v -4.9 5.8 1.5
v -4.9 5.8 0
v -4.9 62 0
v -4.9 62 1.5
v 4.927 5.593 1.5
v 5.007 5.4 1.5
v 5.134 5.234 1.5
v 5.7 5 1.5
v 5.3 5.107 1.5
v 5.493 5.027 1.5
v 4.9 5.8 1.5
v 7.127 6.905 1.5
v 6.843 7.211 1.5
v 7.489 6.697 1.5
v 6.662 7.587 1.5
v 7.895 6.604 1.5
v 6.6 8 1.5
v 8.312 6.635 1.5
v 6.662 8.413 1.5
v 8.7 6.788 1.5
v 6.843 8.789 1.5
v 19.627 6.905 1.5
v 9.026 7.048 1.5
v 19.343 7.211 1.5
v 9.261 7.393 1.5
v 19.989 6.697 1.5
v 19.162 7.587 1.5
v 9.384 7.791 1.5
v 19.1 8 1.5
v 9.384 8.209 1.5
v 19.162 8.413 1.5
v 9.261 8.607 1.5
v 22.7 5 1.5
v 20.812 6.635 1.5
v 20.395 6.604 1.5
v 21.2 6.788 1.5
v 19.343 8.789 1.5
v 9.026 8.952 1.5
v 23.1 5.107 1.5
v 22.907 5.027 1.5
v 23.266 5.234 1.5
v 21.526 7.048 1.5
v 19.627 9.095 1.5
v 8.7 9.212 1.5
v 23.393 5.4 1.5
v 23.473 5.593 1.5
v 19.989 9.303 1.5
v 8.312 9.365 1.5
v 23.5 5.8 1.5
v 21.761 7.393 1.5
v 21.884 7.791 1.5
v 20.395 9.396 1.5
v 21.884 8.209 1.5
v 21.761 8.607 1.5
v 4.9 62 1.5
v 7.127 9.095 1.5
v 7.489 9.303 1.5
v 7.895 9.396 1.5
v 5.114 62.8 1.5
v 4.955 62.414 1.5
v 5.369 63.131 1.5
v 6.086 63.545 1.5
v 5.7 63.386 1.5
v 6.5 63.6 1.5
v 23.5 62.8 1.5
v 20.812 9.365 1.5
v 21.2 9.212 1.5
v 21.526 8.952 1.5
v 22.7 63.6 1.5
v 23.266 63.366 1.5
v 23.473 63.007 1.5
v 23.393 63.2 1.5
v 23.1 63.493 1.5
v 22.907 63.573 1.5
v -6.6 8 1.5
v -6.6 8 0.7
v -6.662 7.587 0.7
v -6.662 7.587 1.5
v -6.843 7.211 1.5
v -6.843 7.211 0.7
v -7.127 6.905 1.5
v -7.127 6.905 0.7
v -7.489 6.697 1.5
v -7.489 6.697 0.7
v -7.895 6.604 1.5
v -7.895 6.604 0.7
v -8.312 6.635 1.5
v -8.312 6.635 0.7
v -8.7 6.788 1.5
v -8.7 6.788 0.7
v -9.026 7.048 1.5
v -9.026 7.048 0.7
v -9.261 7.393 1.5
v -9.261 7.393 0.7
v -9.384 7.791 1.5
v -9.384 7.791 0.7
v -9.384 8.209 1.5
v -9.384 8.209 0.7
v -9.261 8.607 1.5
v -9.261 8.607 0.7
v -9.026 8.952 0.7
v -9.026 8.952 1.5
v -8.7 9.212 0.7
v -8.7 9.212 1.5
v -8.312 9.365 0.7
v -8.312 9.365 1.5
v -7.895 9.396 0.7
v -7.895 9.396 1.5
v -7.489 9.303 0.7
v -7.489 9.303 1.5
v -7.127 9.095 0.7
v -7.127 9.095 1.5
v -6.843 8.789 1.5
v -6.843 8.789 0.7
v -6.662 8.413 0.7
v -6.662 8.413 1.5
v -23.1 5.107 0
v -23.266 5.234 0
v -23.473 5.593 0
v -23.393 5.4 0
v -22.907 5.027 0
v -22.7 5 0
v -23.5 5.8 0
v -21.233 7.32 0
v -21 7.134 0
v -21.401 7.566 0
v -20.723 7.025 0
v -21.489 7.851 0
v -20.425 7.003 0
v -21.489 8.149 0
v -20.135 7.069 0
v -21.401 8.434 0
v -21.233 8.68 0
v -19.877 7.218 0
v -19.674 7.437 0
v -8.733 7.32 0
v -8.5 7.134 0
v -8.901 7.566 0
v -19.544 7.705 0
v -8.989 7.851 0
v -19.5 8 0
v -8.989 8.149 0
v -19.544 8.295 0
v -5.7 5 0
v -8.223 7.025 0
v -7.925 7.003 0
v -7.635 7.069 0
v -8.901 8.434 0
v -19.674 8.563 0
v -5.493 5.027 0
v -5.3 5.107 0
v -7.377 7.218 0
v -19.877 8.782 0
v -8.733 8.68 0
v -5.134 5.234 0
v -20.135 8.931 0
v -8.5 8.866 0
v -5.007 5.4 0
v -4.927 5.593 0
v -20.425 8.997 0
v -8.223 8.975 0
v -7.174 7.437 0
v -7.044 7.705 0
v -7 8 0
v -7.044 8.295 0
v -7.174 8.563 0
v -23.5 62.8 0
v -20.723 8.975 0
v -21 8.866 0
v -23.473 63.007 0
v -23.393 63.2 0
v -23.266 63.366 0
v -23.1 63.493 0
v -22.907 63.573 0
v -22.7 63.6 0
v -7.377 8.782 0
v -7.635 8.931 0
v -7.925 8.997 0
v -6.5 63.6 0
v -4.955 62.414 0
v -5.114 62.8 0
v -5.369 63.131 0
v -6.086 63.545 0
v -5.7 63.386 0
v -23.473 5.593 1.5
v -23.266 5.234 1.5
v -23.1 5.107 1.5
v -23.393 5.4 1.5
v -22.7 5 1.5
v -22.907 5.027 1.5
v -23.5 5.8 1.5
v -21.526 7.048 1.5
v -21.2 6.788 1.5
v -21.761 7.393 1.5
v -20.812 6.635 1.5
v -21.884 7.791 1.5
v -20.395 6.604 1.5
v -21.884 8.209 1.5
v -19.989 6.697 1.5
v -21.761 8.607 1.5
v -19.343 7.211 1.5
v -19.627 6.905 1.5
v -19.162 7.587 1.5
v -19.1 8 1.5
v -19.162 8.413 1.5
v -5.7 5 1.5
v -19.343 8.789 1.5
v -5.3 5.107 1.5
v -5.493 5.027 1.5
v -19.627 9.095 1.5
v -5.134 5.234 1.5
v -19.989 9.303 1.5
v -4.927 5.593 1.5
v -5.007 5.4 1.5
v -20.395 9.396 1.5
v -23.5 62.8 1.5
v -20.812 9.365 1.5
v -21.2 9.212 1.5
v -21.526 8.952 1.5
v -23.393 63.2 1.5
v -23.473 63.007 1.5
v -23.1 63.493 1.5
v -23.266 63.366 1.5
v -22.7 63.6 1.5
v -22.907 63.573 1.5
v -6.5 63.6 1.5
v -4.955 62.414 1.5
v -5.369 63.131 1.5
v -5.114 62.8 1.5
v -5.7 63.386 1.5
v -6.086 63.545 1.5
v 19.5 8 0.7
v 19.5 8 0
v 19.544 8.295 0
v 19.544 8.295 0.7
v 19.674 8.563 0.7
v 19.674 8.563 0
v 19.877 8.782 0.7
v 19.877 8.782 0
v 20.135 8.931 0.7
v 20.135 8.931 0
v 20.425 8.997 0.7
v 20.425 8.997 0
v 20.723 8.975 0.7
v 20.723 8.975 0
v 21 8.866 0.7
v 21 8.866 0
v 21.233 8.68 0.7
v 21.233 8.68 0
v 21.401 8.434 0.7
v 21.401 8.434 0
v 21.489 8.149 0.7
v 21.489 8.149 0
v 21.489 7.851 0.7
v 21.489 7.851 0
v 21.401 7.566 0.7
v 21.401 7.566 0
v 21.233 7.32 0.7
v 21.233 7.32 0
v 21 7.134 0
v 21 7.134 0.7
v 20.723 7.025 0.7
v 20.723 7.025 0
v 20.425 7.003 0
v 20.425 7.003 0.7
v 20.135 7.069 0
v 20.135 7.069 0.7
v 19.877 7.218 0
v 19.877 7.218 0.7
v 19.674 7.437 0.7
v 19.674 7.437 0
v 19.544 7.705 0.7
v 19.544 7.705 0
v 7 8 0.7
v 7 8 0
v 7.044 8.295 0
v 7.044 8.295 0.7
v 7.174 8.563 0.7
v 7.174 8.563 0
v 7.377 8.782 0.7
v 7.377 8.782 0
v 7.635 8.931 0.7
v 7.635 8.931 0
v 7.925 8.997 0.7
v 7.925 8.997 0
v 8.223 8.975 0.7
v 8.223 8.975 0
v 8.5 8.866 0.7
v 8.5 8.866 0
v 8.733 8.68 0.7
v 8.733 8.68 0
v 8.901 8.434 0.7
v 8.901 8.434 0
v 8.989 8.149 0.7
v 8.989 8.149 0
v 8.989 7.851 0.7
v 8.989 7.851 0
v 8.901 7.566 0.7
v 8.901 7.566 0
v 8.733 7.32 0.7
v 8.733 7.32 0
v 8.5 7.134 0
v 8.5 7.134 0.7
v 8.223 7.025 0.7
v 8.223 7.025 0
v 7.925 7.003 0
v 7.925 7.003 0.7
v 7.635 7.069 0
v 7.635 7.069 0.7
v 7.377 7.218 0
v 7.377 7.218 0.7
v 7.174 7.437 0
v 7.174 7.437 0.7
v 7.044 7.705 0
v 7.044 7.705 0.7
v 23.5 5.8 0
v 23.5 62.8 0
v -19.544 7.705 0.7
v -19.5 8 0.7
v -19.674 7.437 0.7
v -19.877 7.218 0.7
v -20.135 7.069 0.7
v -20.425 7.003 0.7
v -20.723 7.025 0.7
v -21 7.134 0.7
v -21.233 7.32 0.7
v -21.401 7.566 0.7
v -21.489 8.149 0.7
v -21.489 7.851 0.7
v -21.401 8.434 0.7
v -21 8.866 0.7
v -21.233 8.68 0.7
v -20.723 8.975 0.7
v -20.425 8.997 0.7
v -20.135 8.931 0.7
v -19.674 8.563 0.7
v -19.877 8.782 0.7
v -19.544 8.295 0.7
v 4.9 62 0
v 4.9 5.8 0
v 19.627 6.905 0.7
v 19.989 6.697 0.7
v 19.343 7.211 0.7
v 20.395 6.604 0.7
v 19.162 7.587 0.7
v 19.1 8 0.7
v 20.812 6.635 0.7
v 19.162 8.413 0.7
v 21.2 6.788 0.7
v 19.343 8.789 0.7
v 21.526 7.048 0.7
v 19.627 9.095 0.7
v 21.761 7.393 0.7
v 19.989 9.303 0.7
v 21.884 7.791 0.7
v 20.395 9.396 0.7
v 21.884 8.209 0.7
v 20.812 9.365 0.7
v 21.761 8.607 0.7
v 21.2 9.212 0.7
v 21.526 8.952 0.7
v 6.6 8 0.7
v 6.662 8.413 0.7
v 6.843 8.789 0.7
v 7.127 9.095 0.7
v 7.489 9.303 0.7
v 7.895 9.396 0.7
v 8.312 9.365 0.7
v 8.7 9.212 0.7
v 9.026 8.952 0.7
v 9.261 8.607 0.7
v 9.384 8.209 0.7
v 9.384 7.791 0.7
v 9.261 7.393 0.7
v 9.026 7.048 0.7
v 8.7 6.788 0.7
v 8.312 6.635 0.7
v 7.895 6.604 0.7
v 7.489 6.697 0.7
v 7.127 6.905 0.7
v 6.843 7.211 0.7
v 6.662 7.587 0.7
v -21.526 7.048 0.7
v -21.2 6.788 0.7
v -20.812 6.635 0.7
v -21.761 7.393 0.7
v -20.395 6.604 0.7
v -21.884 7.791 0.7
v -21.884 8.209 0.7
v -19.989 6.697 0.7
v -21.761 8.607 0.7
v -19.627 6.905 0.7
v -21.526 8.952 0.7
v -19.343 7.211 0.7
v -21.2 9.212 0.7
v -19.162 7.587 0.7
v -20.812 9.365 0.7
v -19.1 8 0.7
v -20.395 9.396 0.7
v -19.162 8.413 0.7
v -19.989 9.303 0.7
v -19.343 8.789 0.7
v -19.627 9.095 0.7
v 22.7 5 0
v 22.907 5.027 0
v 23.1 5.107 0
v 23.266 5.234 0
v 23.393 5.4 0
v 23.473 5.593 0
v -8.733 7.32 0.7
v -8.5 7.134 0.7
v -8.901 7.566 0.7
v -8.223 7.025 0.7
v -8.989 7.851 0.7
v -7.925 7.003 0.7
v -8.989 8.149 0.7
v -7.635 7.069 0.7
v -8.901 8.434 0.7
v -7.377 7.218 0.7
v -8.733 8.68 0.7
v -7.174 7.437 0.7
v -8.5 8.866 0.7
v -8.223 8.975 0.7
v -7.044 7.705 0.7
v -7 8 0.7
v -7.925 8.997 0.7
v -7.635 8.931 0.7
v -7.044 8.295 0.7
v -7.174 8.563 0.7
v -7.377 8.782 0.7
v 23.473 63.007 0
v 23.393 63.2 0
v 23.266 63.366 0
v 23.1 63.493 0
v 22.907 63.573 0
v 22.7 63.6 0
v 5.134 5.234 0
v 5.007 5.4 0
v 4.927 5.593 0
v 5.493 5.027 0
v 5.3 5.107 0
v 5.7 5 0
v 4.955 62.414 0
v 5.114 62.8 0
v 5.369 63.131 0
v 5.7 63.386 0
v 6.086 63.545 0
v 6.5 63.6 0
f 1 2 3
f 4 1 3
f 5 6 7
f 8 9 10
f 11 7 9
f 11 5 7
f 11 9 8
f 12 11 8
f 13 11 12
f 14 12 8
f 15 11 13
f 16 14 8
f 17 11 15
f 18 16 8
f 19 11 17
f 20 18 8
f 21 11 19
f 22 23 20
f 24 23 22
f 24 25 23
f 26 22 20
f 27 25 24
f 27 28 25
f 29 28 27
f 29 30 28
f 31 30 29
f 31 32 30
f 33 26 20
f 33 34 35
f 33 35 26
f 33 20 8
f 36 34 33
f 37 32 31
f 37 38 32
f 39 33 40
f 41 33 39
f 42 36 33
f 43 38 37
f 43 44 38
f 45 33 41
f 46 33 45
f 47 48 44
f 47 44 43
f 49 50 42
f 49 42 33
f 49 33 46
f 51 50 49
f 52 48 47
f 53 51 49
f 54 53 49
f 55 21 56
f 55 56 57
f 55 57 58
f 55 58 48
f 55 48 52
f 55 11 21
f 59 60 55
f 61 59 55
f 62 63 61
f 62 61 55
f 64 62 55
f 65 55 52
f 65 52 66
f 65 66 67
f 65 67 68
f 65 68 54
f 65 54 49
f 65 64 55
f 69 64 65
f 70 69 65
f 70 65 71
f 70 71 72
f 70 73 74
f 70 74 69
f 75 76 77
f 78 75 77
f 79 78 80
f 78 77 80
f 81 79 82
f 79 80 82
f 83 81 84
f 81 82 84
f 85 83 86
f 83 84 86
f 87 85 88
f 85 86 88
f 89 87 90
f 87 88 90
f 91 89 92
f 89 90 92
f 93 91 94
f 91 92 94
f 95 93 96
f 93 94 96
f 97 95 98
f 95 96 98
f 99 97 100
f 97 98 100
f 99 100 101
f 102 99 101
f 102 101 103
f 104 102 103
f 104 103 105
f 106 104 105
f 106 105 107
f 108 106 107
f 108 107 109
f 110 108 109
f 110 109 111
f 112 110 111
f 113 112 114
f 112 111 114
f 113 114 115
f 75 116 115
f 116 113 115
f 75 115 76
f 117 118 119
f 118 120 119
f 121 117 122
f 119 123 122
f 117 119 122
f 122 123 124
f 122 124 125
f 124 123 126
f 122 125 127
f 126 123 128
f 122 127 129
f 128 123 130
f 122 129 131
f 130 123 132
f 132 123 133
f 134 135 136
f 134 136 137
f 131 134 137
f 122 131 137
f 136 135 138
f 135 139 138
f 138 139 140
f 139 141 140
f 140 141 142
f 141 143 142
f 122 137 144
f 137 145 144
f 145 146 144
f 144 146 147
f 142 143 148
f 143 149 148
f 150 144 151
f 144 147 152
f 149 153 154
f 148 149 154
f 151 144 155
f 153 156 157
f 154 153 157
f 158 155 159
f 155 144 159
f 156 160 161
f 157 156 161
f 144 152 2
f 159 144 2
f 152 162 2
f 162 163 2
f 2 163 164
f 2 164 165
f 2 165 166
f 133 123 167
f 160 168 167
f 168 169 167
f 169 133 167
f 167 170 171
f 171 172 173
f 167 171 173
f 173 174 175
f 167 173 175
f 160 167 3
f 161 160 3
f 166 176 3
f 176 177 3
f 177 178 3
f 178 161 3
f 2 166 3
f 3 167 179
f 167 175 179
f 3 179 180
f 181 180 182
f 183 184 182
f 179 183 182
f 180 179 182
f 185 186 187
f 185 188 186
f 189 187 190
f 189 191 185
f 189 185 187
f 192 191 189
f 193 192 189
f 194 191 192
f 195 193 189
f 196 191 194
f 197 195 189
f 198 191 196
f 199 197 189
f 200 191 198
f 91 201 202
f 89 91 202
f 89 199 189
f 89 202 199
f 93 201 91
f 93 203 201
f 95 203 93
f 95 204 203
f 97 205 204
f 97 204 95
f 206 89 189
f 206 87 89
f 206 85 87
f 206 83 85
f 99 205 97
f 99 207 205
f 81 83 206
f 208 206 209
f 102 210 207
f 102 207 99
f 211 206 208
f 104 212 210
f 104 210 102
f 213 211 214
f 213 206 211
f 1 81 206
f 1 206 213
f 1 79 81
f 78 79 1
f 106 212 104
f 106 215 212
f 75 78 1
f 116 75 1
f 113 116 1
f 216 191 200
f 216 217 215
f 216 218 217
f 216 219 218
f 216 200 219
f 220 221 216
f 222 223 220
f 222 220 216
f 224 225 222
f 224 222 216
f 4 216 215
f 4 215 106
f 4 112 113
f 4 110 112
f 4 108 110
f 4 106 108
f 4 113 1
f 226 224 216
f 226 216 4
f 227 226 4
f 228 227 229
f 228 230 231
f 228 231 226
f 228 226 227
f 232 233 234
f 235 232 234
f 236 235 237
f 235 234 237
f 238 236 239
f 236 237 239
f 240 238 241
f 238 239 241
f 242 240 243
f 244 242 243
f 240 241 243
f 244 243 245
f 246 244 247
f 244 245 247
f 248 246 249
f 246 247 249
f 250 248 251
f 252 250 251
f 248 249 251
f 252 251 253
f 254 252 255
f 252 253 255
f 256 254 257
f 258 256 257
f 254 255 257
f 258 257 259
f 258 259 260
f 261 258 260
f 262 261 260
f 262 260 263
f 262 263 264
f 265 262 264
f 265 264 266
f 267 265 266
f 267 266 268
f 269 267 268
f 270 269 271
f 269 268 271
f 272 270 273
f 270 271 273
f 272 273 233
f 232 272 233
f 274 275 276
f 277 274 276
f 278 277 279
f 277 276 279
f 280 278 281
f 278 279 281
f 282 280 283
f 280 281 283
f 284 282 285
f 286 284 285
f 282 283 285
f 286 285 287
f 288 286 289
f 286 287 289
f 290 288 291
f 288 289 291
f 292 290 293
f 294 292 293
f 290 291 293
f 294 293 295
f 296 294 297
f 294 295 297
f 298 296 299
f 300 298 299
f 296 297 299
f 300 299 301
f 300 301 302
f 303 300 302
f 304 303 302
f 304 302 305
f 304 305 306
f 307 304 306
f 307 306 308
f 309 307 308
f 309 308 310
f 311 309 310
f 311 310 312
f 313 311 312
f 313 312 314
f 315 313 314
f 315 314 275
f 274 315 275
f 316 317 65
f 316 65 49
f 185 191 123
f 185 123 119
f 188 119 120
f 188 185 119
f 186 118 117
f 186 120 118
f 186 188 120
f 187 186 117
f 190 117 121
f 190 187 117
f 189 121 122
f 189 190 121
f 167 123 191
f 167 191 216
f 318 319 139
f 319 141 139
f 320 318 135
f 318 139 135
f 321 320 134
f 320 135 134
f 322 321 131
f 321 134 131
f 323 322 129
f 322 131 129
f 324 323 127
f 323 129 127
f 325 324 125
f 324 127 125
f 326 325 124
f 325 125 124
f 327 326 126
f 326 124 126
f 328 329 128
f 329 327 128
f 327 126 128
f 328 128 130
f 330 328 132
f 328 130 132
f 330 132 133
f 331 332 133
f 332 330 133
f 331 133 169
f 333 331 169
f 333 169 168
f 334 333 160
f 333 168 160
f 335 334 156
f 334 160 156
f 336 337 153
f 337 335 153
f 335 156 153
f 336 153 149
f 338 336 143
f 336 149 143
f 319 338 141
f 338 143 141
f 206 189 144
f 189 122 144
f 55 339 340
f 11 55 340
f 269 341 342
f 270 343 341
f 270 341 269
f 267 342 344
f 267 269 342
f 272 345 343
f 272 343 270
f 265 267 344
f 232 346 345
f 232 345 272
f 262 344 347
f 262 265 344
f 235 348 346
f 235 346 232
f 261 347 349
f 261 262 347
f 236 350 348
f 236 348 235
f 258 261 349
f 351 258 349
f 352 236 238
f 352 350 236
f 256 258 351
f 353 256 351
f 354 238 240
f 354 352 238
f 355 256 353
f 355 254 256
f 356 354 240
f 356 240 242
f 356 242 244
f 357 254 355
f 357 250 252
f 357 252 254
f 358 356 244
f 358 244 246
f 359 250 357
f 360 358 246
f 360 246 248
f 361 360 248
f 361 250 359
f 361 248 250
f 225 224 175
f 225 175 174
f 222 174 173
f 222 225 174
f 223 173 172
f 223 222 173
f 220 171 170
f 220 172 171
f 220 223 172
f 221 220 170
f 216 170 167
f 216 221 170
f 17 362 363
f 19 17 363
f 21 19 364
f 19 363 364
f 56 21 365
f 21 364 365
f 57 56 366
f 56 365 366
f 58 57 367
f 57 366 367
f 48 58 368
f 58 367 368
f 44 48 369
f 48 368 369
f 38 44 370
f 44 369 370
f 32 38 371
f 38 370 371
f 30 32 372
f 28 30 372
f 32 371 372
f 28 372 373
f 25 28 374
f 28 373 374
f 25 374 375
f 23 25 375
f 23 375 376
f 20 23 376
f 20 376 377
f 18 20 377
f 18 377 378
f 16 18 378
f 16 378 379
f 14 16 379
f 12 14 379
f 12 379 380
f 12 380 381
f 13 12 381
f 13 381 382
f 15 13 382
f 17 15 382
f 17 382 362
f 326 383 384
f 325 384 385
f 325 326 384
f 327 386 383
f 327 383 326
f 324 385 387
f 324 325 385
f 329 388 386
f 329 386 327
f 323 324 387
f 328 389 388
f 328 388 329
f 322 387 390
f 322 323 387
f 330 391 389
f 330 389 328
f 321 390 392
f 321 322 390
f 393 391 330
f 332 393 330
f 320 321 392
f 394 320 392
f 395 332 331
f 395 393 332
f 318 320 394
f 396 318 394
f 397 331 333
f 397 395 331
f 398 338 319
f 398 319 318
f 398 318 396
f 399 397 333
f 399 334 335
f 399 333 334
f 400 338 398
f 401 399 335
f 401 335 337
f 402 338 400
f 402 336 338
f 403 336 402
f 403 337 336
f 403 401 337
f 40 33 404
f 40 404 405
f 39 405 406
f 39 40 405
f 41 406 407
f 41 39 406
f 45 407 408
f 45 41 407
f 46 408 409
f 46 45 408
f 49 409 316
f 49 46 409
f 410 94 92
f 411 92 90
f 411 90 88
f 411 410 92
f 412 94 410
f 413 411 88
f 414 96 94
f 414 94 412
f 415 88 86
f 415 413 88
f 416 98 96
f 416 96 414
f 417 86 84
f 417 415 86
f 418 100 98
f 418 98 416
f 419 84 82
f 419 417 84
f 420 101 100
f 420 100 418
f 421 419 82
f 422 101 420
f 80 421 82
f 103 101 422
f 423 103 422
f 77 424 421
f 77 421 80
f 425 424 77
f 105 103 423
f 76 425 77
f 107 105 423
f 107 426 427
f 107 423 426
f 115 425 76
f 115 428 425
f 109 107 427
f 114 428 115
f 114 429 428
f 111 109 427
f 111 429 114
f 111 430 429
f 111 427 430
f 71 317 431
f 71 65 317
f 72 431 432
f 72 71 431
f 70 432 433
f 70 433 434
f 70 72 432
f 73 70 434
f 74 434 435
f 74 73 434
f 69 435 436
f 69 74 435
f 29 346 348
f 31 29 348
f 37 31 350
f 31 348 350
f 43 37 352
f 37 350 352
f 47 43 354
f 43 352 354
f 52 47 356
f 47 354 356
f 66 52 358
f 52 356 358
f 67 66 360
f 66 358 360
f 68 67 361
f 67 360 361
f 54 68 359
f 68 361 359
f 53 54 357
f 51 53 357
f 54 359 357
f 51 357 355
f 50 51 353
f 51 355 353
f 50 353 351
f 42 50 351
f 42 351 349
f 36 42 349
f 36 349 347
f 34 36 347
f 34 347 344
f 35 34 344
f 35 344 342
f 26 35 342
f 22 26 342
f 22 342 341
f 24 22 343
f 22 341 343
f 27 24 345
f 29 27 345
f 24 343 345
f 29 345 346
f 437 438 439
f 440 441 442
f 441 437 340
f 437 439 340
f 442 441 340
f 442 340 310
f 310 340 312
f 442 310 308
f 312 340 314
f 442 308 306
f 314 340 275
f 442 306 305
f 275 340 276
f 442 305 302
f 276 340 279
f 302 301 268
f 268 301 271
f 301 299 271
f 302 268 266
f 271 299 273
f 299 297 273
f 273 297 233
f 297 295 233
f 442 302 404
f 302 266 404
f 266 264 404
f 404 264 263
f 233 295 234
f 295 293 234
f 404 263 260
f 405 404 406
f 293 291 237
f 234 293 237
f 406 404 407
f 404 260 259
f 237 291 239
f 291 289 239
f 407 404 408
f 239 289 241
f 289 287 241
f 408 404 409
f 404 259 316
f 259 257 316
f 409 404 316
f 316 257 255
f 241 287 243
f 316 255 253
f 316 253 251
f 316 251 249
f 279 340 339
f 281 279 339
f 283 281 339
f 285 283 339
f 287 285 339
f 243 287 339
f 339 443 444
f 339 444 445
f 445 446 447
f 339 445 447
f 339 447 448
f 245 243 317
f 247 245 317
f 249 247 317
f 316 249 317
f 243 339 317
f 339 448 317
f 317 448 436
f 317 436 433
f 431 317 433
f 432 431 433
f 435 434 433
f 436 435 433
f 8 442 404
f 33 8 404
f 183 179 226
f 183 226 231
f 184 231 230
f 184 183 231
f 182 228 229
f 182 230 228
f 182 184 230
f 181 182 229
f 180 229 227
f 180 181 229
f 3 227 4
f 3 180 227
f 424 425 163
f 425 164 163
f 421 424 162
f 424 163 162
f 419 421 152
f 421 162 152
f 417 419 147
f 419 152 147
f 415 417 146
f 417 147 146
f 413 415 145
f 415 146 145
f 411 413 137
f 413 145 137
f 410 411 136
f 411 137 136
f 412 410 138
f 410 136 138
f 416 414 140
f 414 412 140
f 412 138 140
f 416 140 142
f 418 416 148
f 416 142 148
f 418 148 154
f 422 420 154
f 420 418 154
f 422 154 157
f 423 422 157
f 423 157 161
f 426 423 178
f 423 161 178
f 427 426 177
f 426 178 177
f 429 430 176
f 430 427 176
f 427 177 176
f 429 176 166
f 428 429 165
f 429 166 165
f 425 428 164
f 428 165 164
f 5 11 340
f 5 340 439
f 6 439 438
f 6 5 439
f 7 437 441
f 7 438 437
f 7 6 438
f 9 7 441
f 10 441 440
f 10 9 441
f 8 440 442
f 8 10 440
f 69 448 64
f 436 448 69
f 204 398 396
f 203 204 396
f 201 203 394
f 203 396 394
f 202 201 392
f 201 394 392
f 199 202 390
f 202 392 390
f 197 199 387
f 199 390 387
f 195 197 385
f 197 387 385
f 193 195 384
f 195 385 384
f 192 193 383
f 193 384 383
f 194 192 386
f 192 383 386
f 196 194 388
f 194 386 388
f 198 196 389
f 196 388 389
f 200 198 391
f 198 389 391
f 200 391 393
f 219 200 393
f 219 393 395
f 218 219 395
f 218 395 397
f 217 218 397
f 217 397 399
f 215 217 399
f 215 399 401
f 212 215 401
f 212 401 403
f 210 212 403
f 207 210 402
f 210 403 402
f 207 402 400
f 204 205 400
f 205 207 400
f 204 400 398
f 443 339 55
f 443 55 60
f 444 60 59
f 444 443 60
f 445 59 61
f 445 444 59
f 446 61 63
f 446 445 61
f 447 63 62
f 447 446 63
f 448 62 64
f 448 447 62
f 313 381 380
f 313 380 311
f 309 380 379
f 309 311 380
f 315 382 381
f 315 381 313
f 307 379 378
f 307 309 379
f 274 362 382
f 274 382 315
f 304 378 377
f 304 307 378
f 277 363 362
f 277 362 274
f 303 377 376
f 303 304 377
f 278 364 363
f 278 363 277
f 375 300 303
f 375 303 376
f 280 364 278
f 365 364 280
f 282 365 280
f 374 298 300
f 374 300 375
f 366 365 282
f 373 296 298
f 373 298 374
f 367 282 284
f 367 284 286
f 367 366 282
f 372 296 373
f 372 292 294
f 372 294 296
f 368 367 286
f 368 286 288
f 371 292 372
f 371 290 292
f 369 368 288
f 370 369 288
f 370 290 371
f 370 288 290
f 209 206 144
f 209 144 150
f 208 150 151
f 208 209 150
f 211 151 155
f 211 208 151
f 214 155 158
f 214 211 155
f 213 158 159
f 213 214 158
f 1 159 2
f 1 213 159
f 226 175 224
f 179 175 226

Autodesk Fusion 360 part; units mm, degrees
sketch "mriya-mcu-cover" plane through (0, 0, 0) normal (0, 0, 1) x (1, 0, 0)
  line L0 (-22.7, 5) -> (-5.8, 5) construction
  line L1 (-5, 5.8) -> (-5, 62) construction
  arc A0 (-5.8, 5) -> (-5, 5.8) centre (-5.8, 5.8) ccw construction
  arc A1 (-23.5, 5.8) -> (-22.7, 5) centre (-22.7, 5.8) ccw construction
  line L2 (-4.9, 5) -> (-4.9, 62)
  line L3 (-23.5, 5.8) -> (-23.5, 62.7) construction
  line L4 (-23.5, 63.6) -> (-6.5, 63.6)
  arc A2 (-10, 62.8) -> (-9.3, 63.5) centre (-10, 63.5) ccw construction
  arc A3 (-19.3, 63.5) -> (-18.6, 62.8) centre (-18.6, 63.5) ccw construction
  line L5 (-18.6, 62.8) -> (-10, 62.8) construction
  arc A4 (-22.7, 63.5) -> (-23.5, 62.7) centre (-22.7, 62.7) ccw construction
  line L6 (-22.7, 63.5) -> (-6.5, 63.5) construction
  line L7 (-23.5, 5) -> (-4.9, 5)
  circle A5 centre (-8, 8) radius 1.4
  circle A6 centre (-20.5, 8) radius 1.4
  line L8 (-23.5, 5) -> (-23.5, 63.6)
  arc A7 (-5, 62) -> (-6.5, 63.5) centre (-6.5, 62) ccw construction
  arc A8 (-4.9, 62) -> (-6.5, 63.6) centre (-6.5, 62) ccw
  circle A9 centre (-20.5, 8) radius 1
  circle A10 centre (-8, 8) radius 1
  line L9 (-5, 23.7) -> (-4.9, 23.7)
  dimension "d601" = 2.8
  dimension "d602" = 2.8
  dimension "d609" = 2
  dimension "d610" = 2
extrude "Extrude81" add sketch "mriya-mcu-cover" along normal blind 1.5 contours L2 L4 L7 L8 A8 makes body 1
extrude "Extrude82" add sketch "mriya-mcu-cover" along normal blind 0.7 contours A5 | A6 bodies 1
fillet "Fillet60" radius 0.8 3 edges at (-23.5, 5, 0.75) (-23.5, 63.6, 0.75) (-4.9, 5, 0.75) on bodies 1
mirror "Mirror11" about plane through (0, 0, 0) normal (1, 0, 0) of bodies 1 makes body 2
